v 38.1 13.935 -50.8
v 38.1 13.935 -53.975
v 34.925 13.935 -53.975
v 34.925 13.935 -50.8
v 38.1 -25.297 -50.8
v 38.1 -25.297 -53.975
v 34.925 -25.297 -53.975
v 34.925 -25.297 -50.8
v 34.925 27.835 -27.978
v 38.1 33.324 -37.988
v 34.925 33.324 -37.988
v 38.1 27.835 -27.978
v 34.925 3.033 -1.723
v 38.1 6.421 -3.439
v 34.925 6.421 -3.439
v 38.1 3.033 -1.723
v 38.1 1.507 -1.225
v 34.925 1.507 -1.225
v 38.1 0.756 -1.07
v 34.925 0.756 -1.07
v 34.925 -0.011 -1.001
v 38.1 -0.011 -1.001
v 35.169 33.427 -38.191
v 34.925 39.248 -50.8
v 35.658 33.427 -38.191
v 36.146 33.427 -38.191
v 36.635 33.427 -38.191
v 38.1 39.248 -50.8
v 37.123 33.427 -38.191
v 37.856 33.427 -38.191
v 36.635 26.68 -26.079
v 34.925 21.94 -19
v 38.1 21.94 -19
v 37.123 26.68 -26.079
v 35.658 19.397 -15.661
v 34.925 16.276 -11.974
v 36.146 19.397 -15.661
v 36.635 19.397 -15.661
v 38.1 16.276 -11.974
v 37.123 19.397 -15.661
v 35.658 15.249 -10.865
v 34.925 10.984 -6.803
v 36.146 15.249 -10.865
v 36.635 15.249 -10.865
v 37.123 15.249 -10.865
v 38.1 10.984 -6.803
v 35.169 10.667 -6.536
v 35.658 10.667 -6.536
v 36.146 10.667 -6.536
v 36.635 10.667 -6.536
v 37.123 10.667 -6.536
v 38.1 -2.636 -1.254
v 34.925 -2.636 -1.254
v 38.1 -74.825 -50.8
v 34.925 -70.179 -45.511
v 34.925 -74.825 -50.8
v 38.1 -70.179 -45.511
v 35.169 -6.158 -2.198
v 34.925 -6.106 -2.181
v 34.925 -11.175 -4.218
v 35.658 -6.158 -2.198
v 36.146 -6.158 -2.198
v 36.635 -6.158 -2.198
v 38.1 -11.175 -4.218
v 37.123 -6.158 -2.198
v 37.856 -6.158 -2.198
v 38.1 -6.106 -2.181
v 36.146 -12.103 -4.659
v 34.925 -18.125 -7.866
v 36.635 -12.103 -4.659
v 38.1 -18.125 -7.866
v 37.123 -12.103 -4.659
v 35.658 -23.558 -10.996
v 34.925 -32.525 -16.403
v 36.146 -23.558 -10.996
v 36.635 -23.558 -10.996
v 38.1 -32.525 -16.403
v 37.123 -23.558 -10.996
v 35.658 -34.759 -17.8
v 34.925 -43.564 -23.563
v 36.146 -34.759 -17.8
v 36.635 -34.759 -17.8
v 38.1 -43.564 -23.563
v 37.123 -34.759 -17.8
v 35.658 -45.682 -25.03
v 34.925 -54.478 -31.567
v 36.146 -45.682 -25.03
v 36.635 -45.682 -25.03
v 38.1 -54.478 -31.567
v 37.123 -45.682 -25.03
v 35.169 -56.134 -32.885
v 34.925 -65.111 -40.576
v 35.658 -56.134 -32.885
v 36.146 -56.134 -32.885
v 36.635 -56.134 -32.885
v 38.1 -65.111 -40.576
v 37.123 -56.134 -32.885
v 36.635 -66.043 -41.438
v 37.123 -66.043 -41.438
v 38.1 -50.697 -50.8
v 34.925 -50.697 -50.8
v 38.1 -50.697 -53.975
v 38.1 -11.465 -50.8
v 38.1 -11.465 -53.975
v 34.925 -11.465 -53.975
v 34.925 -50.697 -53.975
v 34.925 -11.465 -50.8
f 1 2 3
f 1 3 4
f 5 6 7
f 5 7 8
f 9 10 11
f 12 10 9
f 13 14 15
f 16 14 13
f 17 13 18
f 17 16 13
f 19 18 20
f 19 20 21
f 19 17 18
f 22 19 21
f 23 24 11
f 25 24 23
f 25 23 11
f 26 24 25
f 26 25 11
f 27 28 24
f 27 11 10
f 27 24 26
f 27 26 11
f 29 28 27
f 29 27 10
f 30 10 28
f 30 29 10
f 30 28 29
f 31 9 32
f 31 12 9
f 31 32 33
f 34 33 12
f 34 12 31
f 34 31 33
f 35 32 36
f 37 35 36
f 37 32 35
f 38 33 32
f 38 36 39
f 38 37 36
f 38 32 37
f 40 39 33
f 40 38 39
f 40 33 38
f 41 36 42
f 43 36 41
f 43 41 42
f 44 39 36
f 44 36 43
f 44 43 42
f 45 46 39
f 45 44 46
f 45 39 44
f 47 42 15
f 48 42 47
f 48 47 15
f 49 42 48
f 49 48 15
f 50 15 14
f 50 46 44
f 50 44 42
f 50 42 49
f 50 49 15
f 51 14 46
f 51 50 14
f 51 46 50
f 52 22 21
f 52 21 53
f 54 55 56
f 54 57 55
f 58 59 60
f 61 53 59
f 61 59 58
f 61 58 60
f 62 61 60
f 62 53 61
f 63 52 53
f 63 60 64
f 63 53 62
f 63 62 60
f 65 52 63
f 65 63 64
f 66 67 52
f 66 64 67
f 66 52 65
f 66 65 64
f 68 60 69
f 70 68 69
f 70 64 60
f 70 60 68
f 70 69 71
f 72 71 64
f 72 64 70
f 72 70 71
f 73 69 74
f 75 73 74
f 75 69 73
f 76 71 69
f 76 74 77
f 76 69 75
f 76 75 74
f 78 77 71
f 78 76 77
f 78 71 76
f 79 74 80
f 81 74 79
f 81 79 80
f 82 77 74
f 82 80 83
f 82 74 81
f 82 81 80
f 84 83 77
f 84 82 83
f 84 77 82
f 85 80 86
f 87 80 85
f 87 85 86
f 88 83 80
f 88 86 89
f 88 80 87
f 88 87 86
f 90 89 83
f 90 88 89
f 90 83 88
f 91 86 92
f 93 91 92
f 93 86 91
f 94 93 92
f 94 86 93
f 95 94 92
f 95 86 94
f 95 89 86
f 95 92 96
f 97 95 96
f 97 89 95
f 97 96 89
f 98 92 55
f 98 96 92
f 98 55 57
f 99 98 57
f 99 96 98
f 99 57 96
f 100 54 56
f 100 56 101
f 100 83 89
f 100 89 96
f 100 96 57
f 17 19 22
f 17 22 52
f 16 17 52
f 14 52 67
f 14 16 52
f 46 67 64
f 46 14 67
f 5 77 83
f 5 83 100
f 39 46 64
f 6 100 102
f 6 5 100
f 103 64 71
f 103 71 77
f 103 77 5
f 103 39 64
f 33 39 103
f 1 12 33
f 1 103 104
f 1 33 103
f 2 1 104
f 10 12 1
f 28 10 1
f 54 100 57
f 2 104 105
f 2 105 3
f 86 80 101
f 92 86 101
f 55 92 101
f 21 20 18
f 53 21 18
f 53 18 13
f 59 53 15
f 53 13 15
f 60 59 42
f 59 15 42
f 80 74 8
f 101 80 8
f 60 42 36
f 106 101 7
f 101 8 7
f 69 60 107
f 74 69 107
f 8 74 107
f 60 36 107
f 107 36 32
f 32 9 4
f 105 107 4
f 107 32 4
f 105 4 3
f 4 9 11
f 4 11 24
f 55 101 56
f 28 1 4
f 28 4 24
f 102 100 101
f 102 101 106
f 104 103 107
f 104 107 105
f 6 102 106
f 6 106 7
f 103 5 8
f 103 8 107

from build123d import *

# Parameters (mm, degrees)
BOSS_EXTRUDE1_DEPTH = 3.175


with BuildPart() as part:
    # Sketch1 → Boss-Extrude1 (new body)
    with BuildSketch(Plane(origin=(38.1, 0, 0), x_dir=(0, 0, -1), z_dir=(1, 0, 0))):
        with BuildLine():
            Line((53.975, 13.934655528), (50.8, 13.934655528))
            Line((50.8, 13.934655528), (50.8, 39.248123167))
            add(Edge.make_bspline(
                [(50.8, 39.248123167), (50.114337, 38.95697122), (45.517089309, 36.98001911), (37.125857024, 33.052669943), (27.830125776, 27.881863583), (20.719091236, 23.242106564), (15.614494654, 19.455138907), (10.786662405, 15.322065366), (6.429542578, 10.752123034), (3.32977957, 6.520652954), (1.7663924, 3.289417246), (1.234577983, 1.629552847), (1.070915718, 0.808496426), (1.022678144, 0.373573946), (1.007771389, 0.114040702), (1.000919428, -0.010571554)],
                knots=[0.920379078, 0.920379078, 0.920379078, 0.920379078, 0.923068011, 0.938443771, 0.95381953, 0.96150741, 0.96919529, 0.97688317, 0.984571049, 0.992258929, 0.996102869, 0.998024839, 0.998985824, 0.999466316, 0.999946809, 0.999946809, 0.999946809, 0.999946809], degree=3))
            add(Edge.make_bspline(
                [(1.000919428, -0.010571554), (1.009921864, -0.277884035), (1.028925425, -0.823363517), (1.10276659, -1.825860568), (1.41675837, -3.59720545), (2.452149912, -7.203198014), (4.557689087, -12.131447527), (7.694251284, -17.873839822), (12.081450574, -25.466402985), (17.732187967, -34.796472344), (24.919918009, -45.768226926), (31.457639598, -54.481002451), (37.047634728, -61.182548528), (42.818130244, -67.680088504), (47.457882264, -72.162847135), (50.8, -74.824969829)],
                knots=[5.1726e-05, 5.1726e-05, 5.1726e-05, 5.1726e-05, 0.001013083, 0.00197444, 0.003897153, 0.00774258, 0.015433433, 0.023124286, 0.030815139, 0.046196845, 0.061578551, 0.076960258, 0.084651111, 0.092341964, 0.107535675, 0.107535675, 0.107535675, 0.107535675], degree=3))
            Line((50.8, -74.824969829), (50.8, -50.696741856))
            Line((50.8, -50.696741856), (53.975, -50.696741856))
            Line((53.975, -50.696741856), (53.975, -25.296741856))
            Line((53.975, -25.296741856), (50.8, -25.296741856))
            Line((50.8, -25.296741856), (50.8, -11.465344472))
            Line((50.8, -11.465344472), (53.975, -11.465344472))
            Line((53.975, -11.465344472), (53.975, 13.934655528))
        make_face()
    extrude(amount=-BOSS_EXTRUDE1_DEPTH)


solid = part.part
